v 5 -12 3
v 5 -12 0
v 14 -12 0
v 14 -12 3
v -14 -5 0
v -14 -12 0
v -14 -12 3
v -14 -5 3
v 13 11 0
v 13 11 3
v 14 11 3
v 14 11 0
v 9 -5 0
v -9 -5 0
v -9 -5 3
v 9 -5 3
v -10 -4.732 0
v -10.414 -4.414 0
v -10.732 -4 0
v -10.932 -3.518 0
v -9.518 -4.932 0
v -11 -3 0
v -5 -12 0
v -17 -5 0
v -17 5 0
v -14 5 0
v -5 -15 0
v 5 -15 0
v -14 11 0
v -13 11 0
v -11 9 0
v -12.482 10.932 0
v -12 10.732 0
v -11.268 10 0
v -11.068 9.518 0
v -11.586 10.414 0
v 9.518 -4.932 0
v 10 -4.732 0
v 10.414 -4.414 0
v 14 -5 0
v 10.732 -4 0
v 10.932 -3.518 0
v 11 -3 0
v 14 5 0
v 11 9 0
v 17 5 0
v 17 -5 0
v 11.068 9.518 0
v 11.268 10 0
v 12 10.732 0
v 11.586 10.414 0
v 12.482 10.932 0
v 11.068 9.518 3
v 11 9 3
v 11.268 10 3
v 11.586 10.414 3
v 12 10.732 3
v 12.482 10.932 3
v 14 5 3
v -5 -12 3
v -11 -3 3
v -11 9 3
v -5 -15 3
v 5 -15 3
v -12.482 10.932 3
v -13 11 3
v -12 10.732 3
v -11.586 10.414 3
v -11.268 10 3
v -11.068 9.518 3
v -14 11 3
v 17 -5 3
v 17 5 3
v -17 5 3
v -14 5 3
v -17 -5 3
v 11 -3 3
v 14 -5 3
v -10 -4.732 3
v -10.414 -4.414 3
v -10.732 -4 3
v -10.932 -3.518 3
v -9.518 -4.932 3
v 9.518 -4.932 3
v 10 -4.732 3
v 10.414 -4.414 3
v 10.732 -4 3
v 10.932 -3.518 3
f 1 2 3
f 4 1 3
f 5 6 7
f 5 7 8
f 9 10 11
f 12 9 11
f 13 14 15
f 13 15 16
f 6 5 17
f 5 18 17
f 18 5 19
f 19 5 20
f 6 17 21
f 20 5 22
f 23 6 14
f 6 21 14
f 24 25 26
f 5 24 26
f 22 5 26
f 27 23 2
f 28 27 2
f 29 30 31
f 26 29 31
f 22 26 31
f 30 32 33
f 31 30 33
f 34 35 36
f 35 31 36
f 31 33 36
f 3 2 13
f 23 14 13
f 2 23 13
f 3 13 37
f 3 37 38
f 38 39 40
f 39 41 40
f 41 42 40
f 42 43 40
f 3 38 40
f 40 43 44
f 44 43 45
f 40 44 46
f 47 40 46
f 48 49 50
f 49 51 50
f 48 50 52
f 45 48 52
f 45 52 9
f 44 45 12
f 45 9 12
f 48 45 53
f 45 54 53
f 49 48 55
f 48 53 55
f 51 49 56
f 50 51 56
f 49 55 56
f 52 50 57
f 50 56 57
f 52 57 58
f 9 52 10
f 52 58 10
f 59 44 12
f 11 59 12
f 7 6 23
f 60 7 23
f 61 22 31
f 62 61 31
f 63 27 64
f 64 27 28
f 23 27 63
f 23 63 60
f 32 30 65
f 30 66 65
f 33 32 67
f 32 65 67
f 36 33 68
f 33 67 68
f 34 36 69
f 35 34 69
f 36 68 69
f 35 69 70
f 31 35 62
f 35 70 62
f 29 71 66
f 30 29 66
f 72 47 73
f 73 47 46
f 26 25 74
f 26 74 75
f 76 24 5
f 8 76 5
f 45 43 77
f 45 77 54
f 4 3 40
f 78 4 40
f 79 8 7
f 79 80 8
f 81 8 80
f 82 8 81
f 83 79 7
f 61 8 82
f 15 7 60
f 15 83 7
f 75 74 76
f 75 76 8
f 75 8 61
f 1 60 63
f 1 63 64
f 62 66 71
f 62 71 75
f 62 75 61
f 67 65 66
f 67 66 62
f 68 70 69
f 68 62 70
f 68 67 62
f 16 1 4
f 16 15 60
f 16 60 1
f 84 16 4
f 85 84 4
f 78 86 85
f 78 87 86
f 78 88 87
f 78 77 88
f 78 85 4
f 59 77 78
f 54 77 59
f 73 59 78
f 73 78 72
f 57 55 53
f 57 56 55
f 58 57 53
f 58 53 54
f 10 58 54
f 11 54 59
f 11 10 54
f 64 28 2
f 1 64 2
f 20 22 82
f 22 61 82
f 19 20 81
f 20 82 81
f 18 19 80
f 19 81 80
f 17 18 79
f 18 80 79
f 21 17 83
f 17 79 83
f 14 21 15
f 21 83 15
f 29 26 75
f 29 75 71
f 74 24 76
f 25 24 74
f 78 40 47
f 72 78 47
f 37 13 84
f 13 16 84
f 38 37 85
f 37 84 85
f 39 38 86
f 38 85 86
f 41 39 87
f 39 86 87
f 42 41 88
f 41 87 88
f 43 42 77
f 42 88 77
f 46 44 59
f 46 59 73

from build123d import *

# Parameters (mm, degrees)
SKETCH_1_W               = 28
SKETCH_1_H               = 24
SKETCH_1_W_2             = 3
SKETCH_1_H_2             = 10
SKETCH_1_W_3             = 10
SKETCH_1_H_3             = 3
EXTRUDE_1_DEPTH          = 3
SKETCH_3_W               = 28
SKETCH_3_H               = 1
CUT_EXTRUDE_2_DEPTH      = 3
CUT_EXTRUDE_3_DEPTH      = 23.869193252
CUT_EXTRUDE_3_DEPTH_BACK = 23.869193252
SKETCH_4_W               = 22
SKETCH_4_H               = 16
FILLET_1_R               = 2


with BuildPart() as part:
    # 草图1 → 凸台-拉伸1 (new body)
    with BuildSketch(Plane.XY):
        Rectangle(SKETCH_1_W, SKETCH_1_H)
        with Locations((-15.5, 0)):
            Rectangle(SKETCH_1_W_2, SKETCH_1_H_2)
        with Locations((15.5, 0)):
            Rectangle(SKETCH_1_W_2, SKETCH_1_H_2)
        with Locations((0, -13.5)):
            Rectangle(SKETCH_1_W_3, SKETCH_1_H_3)
    extrude(amount=EXTRUDE_1_DEPTH)

    # 草图3 → 切除-拉伸2 (cut)
    with BuildSketch(Plane.XY.offset(3)):
        with Locations((0, 11.5)):
            Rectangle(SKETCH_3_W, SKETCH_3_H)
    extrude(amount=-CUT_EXTRUDE_2_DEPTH, mode=Mode.SUBTRACT)

    # 草图4 → 切除-拉伸3 (cut, two sides: drawn at the far end of the back side and taken through both)
    with BuildSketch(Plane.XY.offset(3).offset(-CUT_EXTRUDE_3_DEPTH_BACK)):
        with Locations((0, 3)):
            Rectangle(SKETCH_4_W, SKETCH_4_H)
    extrude(amount=CUT_EXTRUDE_3_DEPTH + CUT_EXTRUDE_3_DEPTH_BACK, mode=Mode.SUBTRACT)

    # 圆角1
    fillet_1_edges = [part.edges().sort_by_distance(p)[0] for p in [
        (-11, -5, 1.5),
        (-11, 11, 1.5),
        (11, 11, 1.5),
        (11, -5, 1.5),
    ]]
    fillet(fillet_1_edges, radius=FILLET_1_R)


solid = part.part
